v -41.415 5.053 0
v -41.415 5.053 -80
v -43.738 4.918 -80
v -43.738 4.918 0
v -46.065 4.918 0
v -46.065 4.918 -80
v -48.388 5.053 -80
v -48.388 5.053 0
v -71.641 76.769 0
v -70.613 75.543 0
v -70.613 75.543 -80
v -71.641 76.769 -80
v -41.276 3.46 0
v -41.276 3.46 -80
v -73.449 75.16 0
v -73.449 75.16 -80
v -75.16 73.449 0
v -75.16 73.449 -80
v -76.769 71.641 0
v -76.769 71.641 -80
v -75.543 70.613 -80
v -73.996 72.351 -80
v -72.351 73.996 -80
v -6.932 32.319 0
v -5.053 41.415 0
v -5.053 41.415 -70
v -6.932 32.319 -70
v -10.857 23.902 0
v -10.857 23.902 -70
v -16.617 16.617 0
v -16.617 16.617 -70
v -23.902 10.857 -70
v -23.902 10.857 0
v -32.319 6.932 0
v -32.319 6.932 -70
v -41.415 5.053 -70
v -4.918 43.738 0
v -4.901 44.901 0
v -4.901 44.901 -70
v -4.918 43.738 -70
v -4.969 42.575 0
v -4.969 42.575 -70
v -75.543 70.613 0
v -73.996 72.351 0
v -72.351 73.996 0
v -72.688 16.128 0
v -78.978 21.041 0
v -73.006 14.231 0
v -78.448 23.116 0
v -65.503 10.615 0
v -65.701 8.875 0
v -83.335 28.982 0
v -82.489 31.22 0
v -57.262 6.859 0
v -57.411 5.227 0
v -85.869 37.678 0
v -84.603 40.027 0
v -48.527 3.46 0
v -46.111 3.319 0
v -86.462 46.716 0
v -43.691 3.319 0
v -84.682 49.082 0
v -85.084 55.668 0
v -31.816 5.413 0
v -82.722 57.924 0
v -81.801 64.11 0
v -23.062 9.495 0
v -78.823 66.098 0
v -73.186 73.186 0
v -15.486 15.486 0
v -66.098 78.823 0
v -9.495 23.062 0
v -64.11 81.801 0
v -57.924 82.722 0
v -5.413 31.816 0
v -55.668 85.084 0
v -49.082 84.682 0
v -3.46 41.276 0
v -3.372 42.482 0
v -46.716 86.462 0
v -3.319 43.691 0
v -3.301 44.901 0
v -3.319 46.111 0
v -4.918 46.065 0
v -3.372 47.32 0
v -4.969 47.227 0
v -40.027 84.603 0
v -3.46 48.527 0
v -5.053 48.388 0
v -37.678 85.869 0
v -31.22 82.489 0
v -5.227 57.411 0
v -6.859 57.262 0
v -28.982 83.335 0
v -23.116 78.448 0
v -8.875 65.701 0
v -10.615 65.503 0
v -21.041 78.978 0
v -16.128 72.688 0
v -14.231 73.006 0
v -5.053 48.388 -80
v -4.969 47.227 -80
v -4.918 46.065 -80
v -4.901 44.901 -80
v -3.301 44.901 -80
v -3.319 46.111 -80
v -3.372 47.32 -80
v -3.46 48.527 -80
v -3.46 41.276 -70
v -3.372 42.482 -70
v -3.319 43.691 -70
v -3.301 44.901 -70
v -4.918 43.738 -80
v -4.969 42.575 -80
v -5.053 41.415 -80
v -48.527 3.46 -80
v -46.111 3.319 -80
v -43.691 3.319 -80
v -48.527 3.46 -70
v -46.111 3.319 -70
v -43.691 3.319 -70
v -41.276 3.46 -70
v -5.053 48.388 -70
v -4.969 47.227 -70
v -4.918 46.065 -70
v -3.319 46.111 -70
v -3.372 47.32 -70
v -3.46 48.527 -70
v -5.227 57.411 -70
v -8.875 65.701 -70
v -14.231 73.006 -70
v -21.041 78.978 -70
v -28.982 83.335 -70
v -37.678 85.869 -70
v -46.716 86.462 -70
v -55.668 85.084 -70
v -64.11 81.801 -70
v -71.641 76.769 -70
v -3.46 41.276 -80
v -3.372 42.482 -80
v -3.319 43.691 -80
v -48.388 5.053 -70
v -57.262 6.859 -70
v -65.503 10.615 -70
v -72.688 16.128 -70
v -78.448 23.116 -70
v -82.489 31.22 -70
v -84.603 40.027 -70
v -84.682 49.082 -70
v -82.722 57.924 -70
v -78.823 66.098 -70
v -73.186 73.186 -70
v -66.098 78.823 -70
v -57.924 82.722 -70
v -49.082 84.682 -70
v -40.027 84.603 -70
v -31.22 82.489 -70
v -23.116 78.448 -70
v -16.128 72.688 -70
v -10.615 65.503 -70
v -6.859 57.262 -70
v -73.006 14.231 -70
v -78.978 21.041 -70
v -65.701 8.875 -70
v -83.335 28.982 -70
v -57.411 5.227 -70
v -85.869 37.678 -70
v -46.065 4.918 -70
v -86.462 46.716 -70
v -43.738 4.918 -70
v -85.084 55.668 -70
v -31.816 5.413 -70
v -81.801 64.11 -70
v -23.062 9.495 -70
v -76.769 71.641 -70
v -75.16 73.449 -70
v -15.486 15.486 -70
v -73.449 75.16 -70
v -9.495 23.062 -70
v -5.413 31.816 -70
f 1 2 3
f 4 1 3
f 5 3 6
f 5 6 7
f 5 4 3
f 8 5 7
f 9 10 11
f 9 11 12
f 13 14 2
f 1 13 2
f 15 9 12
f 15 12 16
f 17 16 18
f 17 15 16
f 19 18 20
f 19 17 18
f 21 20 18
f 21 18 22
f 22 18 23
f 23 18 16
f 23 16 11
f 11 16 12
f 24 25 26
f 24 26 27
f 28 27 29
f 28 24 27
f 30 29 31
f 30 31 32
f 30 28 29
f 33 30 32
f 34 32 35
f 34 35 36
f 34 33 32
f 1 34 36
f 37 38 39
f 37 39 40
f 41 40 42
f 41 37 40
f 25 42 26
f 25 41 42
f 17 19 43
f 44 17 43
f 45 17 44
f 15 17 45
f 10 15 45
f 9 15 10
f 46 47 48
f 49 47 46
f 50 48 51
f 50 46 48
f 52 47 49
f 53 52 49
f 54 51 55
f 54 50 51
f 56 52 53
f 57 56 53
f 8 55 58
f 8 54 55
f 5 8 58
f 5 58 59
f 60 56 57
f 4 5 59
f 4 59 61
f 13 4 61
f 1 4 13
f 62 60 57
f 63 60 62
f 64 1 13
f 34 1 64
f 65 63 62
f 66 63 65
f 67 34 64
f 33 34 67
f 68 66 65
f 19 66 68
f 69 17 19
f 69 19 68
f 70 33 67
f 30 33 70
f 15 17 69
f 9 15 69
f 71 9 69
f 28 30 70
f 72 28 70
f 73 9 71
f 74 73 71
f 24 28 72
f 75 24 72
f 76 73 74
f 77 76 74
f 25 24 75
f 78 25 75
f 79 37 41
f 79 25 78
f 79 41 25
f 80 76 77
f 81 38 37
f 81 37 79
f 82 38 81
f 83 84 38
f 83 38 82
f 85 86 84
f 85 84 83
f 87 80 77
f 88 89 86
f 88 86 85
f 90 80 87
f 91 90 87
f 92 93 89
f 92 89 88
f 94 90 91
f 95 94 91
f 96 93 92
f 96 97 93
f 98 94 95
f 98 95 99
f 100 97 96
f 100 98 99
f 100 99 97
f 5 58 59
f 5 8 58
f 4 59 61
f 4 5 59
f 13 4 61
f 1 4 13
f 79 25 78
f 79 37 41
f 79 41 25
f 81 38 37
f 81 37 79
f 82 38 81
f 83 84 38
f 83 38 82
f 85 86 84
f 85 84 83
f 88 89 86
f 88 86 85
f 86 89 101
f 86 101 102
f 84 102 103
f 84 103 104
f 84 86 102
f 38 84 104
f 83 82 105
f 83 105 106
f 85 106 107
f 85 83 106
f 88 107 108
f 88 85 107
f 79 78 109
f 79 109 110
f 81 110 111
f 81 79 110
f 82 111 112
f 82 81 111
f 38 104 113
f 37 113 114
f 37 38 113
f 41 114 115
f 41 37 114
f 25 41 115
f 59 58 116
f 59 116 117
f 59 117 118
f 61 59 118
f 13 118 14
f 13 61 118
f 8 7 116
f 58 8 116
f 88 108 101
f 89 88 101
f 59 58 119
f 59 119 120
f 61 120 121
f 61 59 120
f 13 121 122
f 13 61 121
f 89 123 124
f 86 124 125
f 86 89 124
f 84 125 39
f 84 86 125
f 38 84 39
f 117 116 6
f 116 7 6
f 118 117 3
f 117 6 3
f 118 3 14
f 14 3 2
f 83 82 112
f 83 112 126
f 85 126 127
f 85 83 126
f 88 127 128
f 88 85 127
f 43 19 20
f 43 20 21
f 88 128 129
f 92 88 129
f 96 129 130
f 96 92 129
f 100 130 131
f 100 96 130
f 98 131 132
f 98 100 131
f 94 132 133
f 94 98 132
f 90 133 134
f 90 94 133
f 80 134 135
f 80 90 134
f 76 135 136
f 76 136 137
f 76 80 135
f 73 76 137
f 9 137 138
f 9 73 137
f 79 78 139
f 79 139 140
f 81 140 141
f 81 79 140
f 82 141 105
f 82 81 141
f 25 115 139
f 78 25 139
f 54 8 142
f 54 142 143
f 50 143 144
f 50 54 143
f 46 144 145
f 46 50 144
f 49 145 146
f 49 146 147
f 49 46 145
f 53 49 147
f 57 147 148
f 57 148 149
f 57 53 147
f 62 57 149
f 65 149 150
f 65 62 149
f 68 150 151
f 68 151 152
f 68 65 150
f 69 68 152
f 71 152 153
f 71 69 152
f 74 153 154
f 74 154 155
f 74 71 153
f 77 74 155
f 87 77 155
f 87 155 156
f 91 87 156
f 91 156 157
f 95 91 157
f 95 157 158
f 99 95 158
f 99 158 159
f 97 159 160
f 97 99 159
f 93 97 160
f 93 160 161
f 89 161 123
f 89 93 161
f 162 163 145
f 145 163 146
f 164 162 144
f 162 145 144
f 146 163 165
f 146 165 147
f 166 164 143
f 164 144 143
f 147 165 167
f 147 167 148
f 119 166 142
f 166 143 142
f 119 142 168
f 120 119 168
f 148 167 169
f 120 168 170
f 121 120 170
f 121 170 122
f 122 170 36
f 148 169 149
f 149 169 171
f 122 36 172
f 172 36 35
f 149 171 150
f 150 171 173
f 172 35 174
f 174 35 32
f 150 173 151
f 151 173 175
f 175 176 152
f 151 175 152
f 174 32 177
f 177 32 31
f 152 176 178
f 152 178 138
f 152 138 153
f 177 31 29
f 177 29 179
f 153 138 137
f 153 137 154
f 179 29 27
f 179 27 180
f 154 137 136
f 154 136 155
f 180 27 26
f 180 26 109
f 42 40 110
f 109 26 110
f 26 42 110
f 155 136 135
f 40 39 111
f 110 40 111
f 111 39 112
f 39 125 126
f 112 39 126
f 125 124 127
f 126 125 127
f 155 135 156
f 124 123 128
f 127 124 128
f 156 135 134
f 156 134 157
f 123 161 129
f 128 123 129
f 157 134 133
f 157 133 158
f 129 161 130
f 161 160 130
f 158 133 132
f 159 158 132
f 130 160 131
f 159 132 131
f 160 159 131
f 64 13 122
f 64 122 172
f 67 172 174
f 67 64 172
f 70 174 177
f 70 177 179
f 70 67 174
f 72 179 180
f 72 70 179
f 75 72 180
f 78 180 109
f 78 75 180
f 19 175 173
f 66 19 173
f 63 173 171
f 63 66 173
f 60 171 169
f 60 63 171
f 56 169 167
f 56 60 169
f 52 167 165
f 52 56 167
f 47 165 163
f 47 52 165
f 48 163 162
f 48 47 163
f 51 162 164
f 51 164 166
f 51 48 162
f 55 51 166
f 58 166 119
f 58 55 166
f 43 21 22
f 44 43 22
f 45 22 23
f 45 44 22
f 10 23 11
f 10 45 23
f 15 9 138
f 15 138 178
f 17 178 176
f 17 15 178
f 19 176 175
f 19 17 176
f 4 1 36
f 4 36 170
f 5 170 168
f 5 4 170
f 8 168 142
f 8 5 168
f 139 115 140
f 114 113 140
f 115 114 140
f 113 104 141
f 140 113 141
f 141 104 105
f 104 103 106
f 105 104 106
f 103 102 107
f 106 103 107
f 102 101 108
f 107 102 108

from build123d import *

# Parameters (mm, degrees)
F1_DEPTH = 80
F2_DEPTH = 70


with BuildPart() as f1:
    # F0 (on Top) → F1 (new body)
    with BuildSketch(Plane.XY):
        with BuildLine():
            Line((-70.6127849928, 75.5430583301), (-71.6412451683, 76.7687294391))
            ThreePointArc((-71.6412451683, 76.7687294391), (-74.3169227027, 74.3169227027), (-76.7687294391, 71.6412451683))
            Line((-76.7687294391, 71.6412451683), (-75.5430583301, 70.6127849928))
            ThreePointArc((-75.5430583301, 70.6127849928), (-73.1855518528, 73.1855518528), (-70.6127849928, 75.5430583301))
        make_face()
    extrude(amount=-F1_DEPTH)


with BuildPart() as f1b:
    # F0 (on Top) → F1, piece 2 (new body)
    with BuildSketch(Plane.XY):
        with BuildLine():
            Line((-5.0534926817, 41.4150508954), (-3.4595811647, 41.275601707))
            ThreePointArc((-3.4595811647, 41.275601707), (-3.3408745875, 43.0867140909), (-3.3012806053, 44.9012806053))
            ThreePointArc((-3.3012806053, 44.9012806053), (-3.3408745875, 46.7158471197), (-3.4595811647, 48.5269595036))
            Line((-3.4595811647, 48.5269595036), (-5.0534926817, 48.3875103153))
            ThreePointArc((-5.0534926817, 48.3875103153), (-4.9393517421, 46.6460561), (-4.9012806053, 44.9012806053))
            ThreePointArc((-4.9012806053, 44.9012806053), (-4.9393517421, 43.1565051107), (-5.0534926817, 41.4150508954))
        make_face()
    extrude(amount=-F1_DEPTH)


with BuildPart() as f1c:
    # F0 (on Top) → F1, piece 3 (new body)
    with BuildSketch(Plane.XY):
        with BuildLine():
            ThreePointArc((-48.5269595036, 3.4595811647), (-44.9012806053, 3.3012806053), (-41.275601707, 3.4595811647))
            Line((-41.275601707, 3.4595811647), (-41.4150508954, 5.0534926817))
            ThreePointArc((-41.4150508954, 5.0534926817), (-44.9012806053, 4.9012806053), (-48.3875103153, 5.0534926817))
            Line((-48.3875103153, 5.0534926817), (-48.5269595036, 3.4595811647))
        make_face()
    extrude(amount=-F1_DEPTH)


with BuildPart() as f2:
    # F0 (on Top) → F2 (new body)
    with BuildSketch(Plane.XY):
        with BuildLine():
            Line((-5.0534926817, 48.3875103153), (-3.4595811647, 48.5269595036))
            ThreePointArc((-3.4595811647, 48.5269595036), (-28.981649819, 83.3346691578), (-71.6412451683, 76.7687294391))
            Line((-71.6412451683, 76.7687294391), (-70.6127849928, 75.5430583301))
            ThreePointArc((-70.6127849928, 75.5430583301), (-29.5939433107, 81.8564619058), (-5.0534926817, 48.3875103153))
        make_face()
        with BuildLine():
            Line((-70.6127849928, 75.5430583301), (-71.6412451683, 76.7687294391))
            ThreePointArc((-71.6412451683, 76.7687294391), (-74.3169227027, 74.3169227027), (-76.7687294391, 71.6412451683))
            Line((-76.7687294391, 71.6412451683), (-75.5430583301, 70.6127849928))
            ThreePointArc((-75.5430583301, 70.6127849928), (-73.1855518528, 73.1855518528), (-70.6127849928, 75.5430583301))
        make_face()
        with BuildLine():
            ThreePointArc((-76.7687294391, 71.6412451683), (-83.3346691578, 28.981649819), (-48.5269595036, 3.4595811647))
            Line((-48.5269595036, 3.4595811647), (-48.3875103153, 5.0534926817))
            ThreePointArc((-48.3875103153, 5.0534926817), (-81.8564619058, 29.5939433107), (-75.5430583301, 70.6127849928))
            Line((-75.5430583301, 70.6127849928), (-76.7687294391, 71.6412451683))
        make_face()
        with BuildLine():
            ThreePointArc((-48.5269595036, 3.4595811647), (-44.9012806053, 3.3012806053), (-41.275601707, 3.4595811647))
            Line((-41.275601707, 3.4595811647), (-41.4150508954, 5.0534926817))
            ThreePointArc((-41.4150508954, 5.0534926817), (-44.9012806053, 4.9012806053), (-48.3875103153, 5.0534926817))
            Line((-48.3875103153, 5.0534926817), (-48.5269595036, 3.4595811647))
        make_face()
        with BuildLine():
            ThreePointArc((-41.275601707, 3.4595811647), (-15.485638508, 15.485638508), (-3.4595811647, 41.275601707))
            Line((-3.4595811647, 41.275601707), (-5.0534926817, 41.4150508954))
            ThreePointArc((-5.0534926817, 41.4150508954), (-16.6170093579, 16.6170093579), (-41.4150508954, 5.0534926817))
            Line((-41.4150508954, 5.0534926817), (-41.275601707, 3.4595811647))
        make_face()
        with BuildLine():
            Line((-5.0534926817, 41.4150508954), (-3.4595811647, 41.275601707))
            ThreePointArc((-3.4595811647, 41.275601707), (-3.3408745875, 43.0867140909), (-3.3012806053, 44.9012806053))
            ThreePointArc((-3.3012806053, 44.9012806053), (-3.3408745875, 46.7158471197), (-3.4595811647, 48.5269595036))
            Line((-3.4595811647, 48.5269595036), (-5.0534926817, 48.3875103153))
            ThreePointArc((-5.0534926817, 48.3875103153), (-4.9393517421, 46.6460561), (-4.9012806053, 44.9012806053))
            ThreePointArc((-4.9012806053, 44.9012806053), (-4.9393517421, 43.1565051107), (-5.0534926817, 41.4150508954))
        make_face()
    extrude(amount=-F2_DEPTH)


solid = Compound([f1.part, f1b.part, f1c.part, f2.part])
